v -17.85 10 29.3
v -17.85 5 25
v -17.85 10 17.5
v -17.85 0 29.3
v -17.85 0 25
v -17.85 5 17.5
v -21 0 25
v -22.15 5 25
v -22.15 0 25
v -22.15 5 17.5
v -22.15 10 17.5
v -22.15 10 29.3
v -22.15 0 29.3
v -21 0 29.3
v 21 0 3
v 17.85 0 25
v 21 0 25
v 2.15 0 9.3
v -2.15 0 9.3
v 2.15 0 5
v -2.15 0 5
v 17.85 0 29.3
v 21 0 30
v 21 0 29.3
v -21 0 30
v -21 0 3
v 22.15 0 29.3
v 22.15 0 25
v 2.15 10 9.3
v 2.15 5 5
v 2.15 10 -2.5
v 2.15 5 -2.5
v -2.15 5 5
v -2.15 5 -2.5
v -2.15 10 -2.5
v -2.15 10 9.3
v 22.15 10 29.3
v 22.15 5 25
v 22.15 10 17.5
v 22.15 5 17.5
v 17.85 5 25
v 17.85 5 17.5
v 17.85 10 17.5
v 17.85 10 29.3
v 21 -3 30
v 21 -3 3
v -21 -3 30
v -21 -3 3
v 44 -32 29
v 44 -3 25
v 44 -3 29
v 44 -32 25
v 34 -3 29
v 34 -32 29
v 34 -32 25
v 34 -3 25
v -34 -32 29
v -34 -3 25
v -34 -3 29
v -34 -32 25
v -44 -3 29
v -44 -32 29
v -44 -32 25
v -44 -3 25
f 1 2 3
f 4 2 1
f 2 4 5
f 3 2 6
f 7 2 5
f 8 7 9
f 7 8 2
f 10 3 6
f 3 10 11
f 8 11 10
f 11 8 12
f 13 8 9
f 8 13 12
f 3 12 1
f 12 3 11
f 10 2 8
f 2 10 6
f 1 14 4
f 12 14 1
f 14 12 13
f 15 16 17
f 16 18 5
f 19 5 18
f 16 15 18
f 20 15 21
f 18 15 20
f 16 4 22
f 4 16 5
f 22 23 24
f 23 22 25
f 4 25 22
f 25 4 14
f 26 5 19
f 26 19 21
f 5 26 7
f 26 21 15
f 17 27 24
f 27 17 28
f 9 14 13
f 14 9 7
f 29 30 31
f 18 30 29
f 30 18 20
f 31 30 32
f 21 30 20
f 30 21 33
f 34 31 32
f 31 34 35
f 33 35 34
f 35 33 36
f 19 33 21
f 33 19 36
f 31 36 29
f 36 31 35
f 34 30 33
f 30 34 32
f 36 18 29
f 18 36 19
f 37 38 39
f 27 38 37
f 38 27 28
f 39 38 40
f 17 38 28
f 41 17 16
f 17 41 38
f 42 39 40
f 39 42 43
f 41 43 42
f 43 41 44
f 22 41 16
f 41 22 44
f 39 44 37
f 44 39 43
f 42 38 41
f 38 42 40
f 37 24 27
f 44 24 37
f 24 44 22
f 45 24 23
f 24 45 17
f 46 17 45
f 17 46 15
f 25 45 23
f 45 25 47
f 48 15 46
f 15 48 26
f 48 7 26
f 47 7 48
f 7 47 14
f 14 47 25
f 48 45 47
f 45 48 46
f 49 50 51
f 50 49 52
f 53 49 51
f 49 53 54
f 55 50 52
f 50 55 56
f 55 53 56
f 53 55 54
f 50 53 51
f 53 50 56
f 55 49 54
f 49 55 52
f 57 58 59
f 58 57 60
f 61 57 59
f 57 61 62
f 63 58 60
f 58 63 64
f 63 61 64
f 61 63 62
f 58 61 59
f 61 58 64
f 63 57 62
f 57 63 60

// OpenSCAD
// file: ../../modules/skadis.scad
ikea_skadis_hole_w = 4.3;
ikea_skadis_hook_depth = 5;
ikea_skadis_hole_h = 7.5;
ikea_skadis_holes_dist = 80;
ikea_skadis_holes_horiz_dist = 40;

module skadis_hook() {
    color("green")
    translate([0,ikea_skadis_hook_depth,-ikea_skadis_hole_h]) cube([ikea_skadis_hole_w,ikea_skadis_hook_depth,ikea_skadis_hole_h ]);

    color("violet")
    translate([0,0,0]) cube([ikea_skadis_hole_w,ikea_skadis_hook_depth*2,ikea_skadis_hole_w ]);
}

module skadis_double_hooks() {
    skadis_hook();
    
    translate([0,0,ikea_skadis_holes_dist]) skadis_hook();
    
    color("yellow")
    translate([0,-ikea_skadis_hook_depth,0])
    cube([ikea_skadis_hole_w,ikea_skadis_hook_depth,ikea_skadis_holes_dist + ikea_skadis_hole_w]);
}

module skadis_triple_horiz_hooks() {
    translate([-20 - ikea_skadis_hole_w / 2,0,0]) union() {
        skadis_hook();
        translate([20,0,-20]) skadis_hook();
        translate([40,0,0]) skadis_hook();
    }
}

//skadis_double_hooks();
//skadis_triple_horiz_hooks();
// main file
include <../../modules/skadis.scad>;

w = 42;

translate([-w/2,-3,3]) cube([w,3,27]);
translate([0,0,25]) skadis_triple_horiz_hooks();
translate([34,-32,25]) cube([10, 29, 4]);
translate([-34-10,-32,25]) cube([10, 29, 4]);
